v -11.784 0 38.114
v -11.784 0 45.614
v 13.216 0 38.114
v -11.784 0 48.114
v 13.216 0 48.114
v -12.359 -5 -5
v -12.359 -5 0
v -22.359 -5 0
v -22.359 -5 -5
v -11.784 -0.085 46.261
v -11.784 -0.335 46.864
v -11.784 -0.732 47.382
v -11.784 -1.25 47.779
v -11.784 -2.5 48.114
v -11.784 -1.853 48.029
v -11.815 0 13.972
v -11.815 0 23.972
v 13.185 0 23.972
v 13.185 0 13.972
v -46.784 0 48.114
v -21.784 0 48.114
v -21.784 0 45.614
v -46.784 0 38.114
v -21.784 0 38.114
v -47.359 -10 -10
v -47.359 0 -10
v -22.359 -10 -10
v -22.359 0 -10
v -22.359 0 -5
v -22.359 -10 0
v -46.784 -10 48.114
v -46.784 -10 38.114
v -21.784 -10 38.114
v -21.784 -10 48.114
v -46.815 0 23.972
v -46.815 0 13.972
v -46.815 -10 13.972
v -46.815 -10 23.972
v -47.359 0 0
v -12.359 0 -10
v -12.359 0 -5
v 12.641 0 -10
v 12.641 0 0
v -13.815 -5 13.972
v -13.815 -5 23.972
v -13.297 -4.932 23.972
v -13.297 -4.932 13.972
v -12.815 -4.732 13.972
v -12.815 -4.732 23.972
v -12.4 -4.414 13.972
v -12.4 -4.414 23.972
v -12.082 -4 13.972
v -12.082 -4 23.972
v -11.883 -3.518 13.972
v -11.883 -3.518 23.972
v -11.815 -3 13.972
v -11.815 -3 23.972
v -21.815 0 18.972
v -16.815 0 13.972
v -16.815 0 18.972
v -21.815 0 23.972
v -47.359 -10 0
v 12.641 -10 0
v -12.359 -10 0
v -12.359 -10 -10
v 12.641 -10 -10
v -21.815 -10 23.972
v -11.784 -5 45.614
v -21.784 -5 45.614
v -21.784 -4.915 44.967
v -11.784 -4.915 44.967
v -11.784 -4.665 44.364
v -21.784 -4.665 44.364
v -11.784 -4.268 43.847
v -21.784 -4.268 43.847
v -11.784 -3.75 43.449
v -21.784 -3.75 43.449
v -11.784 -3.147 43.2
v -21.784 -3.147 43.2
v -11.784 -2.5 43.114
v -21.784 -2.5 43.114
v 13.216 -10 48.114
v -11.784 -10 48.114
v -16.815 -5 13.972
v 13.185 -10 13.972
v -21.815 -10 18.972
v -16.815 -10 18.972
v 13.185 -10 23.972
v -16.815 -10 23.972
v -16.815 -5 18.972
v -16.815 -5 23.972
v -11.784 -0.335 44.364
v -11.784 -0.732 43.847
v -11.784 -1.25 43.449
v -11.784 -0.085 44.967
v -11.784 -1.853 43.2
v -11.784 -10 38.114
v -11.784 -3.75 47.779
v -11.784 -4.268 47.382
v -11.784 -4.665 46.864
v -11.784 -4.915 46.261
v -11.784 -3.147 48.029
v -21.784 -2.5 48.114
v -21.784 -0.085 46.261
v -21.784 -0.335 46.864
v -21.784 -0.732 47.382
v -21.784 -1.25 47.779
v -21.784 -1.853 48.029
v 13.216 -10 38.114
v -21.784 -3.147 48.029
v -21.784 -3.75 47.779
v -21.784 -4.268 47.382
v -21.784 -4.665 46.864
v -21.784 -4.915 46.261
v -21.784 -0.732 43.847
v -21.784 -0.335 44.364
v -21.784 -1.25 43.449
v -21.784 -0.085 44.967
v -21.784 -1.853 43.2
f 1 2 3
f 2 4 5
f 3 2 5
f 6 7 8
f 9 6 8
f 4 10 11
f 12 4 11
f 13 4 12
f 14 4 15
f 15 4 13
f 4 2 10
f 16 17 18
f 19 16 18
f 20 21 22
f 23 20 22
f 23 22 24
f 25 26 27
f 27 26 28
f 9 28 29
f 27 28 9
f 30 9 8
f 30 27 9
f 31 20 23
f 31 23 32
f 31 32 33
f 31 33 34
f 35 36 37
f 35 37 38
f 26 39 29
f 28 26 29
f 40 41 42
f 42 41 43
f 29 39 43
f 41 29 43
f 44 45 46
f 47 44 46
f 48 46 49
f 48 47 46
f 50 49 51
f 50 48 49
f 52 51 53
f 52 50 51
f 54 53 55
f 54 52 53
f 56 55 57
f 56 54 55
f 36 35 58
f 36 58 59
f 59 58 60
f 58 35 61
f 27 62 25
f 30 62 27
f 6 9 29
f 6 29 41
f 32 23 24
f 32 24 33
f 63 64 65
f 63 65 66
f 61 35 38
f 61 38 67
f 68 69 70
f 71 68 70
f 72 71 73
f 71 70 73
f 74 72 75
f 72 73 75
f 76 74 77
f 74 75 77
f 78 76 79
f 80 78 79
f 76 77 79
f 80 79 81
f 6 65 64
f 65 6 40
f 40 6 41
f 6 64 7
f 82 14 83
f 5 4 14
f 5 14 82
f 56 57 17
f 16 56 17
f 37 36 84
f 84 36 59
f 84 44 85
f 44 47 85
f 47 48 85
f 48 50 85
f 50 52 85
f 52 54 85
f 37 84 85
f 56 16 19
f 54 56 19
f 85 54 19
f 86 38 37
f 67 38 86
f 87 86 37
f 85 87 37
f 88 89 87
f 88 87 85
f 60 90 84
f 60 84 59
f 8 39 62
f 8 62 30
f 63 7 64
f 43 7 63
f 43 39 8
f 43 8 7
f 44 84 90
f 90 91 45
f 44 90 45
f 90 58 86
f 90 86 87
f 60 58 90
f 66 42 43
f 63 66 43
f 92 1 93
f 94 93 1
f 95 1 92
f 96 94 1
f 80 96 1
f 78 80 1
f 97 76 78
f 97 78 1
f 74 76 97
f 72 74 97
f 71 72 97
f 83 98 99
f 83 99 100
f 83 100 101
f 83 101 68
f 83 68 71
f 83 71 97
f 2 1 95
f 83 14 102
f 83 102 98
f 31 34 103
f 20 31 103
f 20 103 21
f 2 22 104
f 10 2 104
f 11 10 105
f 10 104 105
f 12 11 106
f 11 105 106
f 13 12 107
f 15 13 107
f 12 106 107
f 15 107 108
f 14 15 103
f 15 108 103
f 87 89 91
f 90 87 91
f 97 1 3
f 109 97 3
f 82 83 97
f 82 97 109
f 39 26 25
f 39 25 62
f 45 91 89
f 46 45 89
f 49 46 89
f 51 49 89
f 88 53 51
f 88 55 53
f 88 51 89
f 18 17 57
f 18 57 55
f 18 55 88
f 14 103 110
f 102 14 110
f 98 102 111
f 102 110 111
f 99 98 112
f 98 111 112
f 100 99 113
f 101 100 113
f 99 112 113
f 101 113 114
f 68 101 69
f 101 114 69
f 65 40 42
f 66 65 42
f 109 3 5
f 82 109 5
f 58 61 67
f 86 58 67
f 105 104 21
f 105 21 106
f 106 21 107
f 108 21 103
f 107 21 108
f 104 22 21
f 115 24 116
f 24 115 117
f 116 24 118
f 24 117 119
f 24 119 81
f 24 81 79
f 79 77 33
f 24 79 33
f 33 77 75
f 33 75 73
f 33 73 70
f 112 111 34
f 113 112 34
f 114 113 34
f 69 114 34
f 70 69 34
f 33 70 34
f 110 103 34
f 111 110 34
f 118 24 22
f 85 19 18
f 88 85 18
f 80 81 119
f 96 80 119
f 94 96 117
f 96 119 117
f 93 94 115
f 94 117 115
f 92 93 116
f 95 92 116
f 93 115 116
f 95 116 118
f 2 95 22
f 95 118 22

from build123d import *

# Parameters (mm, degrees)
F0_W      = 60
F0_H      = 10
F1_DEPTH  = 10
F3_DEPTH  = 10
F4_W      = 10
F4_H      = 5
F5_DEPTH  = 5
F7_DEPTH  = 5
F6_W      = 5
F6_H      = 5
F8_DEPTH  = 10
F9_R      = 2
F11_DEPTH = 35
F12_DEPTH = 25
F14_DEPTH = 25


with BuildPart() as f1:
    # F0 (on Front) → F1 (new body)
    with BuildSketch(Plane.XZ):
        with Locations((-16.7842754163, 43.1144291859)):
            Rectangle(F0_W, F0_H)
    extrude(amount=F1_DEPTH)

    # F10 (on face) → F11 (cut)
    with BuildSketch(Plane(origin=(-46.7842754163, 0, 0), x_dir=(0, -1, 0), z_dir=(-1, 0, 0))):
        with BuildLine():
            ThreePointArc((0, 45.6144291859), (0.732233047, 47.3821961388), (2.5, 48.1144291859))
            Line((2.5, 48.1144291859), (0, 48.1144291859))
            Line((0, 48.1144291859), (0, 45.6144291859))
        make_face()
        with BuildLine():
            Line((5, 45.6144291859), (5, 48.1144291859))
            Line((5, 48.1144291859), (2.5, 48.1144291859))
            ThreePointArc((2.5, 48.1144291859), (4.267766953, 47.3821961388), (5, 45.6144291859))
        make_face()
        with BuildLine():
            Line((0, 43.1144291859), (2.5, 43.1144291859))
            ThreePointArc((2.5, 43.1144291859), (0.732233047, 43.8466622329), (0, 45.6144291859))
            Line((0, 45.6144291859), (0, 43.1144291859))
        make_face()
        with BuildLine():
            Line((5, 43.1144291859), (5, 45.6144291859))
            ThreePointArc((5, 45.6144291859), (4.267766953, 43.8466622329), (2.5, 43.1144291859))
            Line((2.5, 43.1144291859), (5, 43.1144291859))
        make_face()
        Polygon((10, 38.1144291859), (10, 48.1144291859), (5, 48.1144291859), (5, 45.6144291859), (5, 43.1144291859), (2.5, 43.1144291859), (0, 43.1144291859), (0, 38.1144291859), align=None)
    extrude(amount=-F11_DEPTH, mode=Mode.SUBTRACT)

    # F12 (cut): a face of the model
    f12_faces = [f1.faces().sort_by_distance(p)[0] for p in [
        (-46.7842754163, -2.5, 45.6144291859),
    ]]
    extrude(f12_faces, amount=-F12_DEPTH, mode=Mode.SUBTRACT)

    # F13 (on face) → F14 (join)
    with BuildSketch(Plane(origin=(-21.7842754163, 0, 0), x_dir=(0, -1, 0), z_dir=(-1, 0, 0))):
        Polygon((10, 48.1144291859), (2.5, 48.1144291859), (0, 48.1144291859), (0, 38.1144291859), (10, 38.1144291859), align=None)
    extrude(amount=F14_DEPTH)


with BuildPart() as f1b:
    # F0 (on Front) → F1, piece 2 (new body)
    with BuildSketch(Plane.XZ):
        with Locations((-16.814519912, 18.9717739075)):
            Rectangle(F0_W, F0_H)
    extrude(amount=F1_DEPTH)

    # F6 (on face) → F7 (cut)
    with BuildSketch(Plane.XY.offset(23.9717739075)):
        Polygon((-21.814519912, 0), (-21.814519912, -10), (-16.814519912, -10), (-16.814519912, -5), (-16.814519912, 0), align=None)
    extrude(amount=-F7_DEPTH, mode=Mode.SUBTRACT)

    # F6 (on face) → F8 (cut)
    with BuildSketch(Plane.XY.offset(23.9717739075)):
        with Locations((-14.314519912, -2.5)):
            Rectangle(F6_W, F6_H)
    extrude(amount=-F8_DEPTH, mode=Mode.SUBTRACT)

    # F9
    f9_edges = [f1b.edges().sort_by_distance(p)[0] for p in [
        (-11.81452, -5, 18.971774),
    ]]
    fillet(f9_edges, radius=F9_R)


with BuildPart() as f1c:
    # F0 (on Front) → F1, piece 3 (new body)
    with BuildSketch(Plane.XZ):
        with Locations((-17.3588742316, -5)):
            Rectangle(F0_W, F0_H)
    extrude(amount=F1_DEPTH)

    # F2 (on face) → F3 (cut)
    with BuildSketch(Plane.XY):
        Polygon((-22.3588742316, -5), (-22.3588742316, -10), (-17.3588742316, -10), (-12.3588742316, -10), (-12.3588742316, -5), align=None)
    extrude(amount=-F3_DEPTH, mode=Mode.SUBTRACT)

    # F4 (on face) → F5 (cut)
    with BuildSketch(Plane.XZ.offset(5)):
        with Locations((-17.3588742316, -7.5)):
            Rectangle(F4_W, F4_H)
    extrude(amount=-F5_DEPTH, mode=Mode.SUBTRACT)


solid = Compound([f1.part, f1b.part, f1c.part])
